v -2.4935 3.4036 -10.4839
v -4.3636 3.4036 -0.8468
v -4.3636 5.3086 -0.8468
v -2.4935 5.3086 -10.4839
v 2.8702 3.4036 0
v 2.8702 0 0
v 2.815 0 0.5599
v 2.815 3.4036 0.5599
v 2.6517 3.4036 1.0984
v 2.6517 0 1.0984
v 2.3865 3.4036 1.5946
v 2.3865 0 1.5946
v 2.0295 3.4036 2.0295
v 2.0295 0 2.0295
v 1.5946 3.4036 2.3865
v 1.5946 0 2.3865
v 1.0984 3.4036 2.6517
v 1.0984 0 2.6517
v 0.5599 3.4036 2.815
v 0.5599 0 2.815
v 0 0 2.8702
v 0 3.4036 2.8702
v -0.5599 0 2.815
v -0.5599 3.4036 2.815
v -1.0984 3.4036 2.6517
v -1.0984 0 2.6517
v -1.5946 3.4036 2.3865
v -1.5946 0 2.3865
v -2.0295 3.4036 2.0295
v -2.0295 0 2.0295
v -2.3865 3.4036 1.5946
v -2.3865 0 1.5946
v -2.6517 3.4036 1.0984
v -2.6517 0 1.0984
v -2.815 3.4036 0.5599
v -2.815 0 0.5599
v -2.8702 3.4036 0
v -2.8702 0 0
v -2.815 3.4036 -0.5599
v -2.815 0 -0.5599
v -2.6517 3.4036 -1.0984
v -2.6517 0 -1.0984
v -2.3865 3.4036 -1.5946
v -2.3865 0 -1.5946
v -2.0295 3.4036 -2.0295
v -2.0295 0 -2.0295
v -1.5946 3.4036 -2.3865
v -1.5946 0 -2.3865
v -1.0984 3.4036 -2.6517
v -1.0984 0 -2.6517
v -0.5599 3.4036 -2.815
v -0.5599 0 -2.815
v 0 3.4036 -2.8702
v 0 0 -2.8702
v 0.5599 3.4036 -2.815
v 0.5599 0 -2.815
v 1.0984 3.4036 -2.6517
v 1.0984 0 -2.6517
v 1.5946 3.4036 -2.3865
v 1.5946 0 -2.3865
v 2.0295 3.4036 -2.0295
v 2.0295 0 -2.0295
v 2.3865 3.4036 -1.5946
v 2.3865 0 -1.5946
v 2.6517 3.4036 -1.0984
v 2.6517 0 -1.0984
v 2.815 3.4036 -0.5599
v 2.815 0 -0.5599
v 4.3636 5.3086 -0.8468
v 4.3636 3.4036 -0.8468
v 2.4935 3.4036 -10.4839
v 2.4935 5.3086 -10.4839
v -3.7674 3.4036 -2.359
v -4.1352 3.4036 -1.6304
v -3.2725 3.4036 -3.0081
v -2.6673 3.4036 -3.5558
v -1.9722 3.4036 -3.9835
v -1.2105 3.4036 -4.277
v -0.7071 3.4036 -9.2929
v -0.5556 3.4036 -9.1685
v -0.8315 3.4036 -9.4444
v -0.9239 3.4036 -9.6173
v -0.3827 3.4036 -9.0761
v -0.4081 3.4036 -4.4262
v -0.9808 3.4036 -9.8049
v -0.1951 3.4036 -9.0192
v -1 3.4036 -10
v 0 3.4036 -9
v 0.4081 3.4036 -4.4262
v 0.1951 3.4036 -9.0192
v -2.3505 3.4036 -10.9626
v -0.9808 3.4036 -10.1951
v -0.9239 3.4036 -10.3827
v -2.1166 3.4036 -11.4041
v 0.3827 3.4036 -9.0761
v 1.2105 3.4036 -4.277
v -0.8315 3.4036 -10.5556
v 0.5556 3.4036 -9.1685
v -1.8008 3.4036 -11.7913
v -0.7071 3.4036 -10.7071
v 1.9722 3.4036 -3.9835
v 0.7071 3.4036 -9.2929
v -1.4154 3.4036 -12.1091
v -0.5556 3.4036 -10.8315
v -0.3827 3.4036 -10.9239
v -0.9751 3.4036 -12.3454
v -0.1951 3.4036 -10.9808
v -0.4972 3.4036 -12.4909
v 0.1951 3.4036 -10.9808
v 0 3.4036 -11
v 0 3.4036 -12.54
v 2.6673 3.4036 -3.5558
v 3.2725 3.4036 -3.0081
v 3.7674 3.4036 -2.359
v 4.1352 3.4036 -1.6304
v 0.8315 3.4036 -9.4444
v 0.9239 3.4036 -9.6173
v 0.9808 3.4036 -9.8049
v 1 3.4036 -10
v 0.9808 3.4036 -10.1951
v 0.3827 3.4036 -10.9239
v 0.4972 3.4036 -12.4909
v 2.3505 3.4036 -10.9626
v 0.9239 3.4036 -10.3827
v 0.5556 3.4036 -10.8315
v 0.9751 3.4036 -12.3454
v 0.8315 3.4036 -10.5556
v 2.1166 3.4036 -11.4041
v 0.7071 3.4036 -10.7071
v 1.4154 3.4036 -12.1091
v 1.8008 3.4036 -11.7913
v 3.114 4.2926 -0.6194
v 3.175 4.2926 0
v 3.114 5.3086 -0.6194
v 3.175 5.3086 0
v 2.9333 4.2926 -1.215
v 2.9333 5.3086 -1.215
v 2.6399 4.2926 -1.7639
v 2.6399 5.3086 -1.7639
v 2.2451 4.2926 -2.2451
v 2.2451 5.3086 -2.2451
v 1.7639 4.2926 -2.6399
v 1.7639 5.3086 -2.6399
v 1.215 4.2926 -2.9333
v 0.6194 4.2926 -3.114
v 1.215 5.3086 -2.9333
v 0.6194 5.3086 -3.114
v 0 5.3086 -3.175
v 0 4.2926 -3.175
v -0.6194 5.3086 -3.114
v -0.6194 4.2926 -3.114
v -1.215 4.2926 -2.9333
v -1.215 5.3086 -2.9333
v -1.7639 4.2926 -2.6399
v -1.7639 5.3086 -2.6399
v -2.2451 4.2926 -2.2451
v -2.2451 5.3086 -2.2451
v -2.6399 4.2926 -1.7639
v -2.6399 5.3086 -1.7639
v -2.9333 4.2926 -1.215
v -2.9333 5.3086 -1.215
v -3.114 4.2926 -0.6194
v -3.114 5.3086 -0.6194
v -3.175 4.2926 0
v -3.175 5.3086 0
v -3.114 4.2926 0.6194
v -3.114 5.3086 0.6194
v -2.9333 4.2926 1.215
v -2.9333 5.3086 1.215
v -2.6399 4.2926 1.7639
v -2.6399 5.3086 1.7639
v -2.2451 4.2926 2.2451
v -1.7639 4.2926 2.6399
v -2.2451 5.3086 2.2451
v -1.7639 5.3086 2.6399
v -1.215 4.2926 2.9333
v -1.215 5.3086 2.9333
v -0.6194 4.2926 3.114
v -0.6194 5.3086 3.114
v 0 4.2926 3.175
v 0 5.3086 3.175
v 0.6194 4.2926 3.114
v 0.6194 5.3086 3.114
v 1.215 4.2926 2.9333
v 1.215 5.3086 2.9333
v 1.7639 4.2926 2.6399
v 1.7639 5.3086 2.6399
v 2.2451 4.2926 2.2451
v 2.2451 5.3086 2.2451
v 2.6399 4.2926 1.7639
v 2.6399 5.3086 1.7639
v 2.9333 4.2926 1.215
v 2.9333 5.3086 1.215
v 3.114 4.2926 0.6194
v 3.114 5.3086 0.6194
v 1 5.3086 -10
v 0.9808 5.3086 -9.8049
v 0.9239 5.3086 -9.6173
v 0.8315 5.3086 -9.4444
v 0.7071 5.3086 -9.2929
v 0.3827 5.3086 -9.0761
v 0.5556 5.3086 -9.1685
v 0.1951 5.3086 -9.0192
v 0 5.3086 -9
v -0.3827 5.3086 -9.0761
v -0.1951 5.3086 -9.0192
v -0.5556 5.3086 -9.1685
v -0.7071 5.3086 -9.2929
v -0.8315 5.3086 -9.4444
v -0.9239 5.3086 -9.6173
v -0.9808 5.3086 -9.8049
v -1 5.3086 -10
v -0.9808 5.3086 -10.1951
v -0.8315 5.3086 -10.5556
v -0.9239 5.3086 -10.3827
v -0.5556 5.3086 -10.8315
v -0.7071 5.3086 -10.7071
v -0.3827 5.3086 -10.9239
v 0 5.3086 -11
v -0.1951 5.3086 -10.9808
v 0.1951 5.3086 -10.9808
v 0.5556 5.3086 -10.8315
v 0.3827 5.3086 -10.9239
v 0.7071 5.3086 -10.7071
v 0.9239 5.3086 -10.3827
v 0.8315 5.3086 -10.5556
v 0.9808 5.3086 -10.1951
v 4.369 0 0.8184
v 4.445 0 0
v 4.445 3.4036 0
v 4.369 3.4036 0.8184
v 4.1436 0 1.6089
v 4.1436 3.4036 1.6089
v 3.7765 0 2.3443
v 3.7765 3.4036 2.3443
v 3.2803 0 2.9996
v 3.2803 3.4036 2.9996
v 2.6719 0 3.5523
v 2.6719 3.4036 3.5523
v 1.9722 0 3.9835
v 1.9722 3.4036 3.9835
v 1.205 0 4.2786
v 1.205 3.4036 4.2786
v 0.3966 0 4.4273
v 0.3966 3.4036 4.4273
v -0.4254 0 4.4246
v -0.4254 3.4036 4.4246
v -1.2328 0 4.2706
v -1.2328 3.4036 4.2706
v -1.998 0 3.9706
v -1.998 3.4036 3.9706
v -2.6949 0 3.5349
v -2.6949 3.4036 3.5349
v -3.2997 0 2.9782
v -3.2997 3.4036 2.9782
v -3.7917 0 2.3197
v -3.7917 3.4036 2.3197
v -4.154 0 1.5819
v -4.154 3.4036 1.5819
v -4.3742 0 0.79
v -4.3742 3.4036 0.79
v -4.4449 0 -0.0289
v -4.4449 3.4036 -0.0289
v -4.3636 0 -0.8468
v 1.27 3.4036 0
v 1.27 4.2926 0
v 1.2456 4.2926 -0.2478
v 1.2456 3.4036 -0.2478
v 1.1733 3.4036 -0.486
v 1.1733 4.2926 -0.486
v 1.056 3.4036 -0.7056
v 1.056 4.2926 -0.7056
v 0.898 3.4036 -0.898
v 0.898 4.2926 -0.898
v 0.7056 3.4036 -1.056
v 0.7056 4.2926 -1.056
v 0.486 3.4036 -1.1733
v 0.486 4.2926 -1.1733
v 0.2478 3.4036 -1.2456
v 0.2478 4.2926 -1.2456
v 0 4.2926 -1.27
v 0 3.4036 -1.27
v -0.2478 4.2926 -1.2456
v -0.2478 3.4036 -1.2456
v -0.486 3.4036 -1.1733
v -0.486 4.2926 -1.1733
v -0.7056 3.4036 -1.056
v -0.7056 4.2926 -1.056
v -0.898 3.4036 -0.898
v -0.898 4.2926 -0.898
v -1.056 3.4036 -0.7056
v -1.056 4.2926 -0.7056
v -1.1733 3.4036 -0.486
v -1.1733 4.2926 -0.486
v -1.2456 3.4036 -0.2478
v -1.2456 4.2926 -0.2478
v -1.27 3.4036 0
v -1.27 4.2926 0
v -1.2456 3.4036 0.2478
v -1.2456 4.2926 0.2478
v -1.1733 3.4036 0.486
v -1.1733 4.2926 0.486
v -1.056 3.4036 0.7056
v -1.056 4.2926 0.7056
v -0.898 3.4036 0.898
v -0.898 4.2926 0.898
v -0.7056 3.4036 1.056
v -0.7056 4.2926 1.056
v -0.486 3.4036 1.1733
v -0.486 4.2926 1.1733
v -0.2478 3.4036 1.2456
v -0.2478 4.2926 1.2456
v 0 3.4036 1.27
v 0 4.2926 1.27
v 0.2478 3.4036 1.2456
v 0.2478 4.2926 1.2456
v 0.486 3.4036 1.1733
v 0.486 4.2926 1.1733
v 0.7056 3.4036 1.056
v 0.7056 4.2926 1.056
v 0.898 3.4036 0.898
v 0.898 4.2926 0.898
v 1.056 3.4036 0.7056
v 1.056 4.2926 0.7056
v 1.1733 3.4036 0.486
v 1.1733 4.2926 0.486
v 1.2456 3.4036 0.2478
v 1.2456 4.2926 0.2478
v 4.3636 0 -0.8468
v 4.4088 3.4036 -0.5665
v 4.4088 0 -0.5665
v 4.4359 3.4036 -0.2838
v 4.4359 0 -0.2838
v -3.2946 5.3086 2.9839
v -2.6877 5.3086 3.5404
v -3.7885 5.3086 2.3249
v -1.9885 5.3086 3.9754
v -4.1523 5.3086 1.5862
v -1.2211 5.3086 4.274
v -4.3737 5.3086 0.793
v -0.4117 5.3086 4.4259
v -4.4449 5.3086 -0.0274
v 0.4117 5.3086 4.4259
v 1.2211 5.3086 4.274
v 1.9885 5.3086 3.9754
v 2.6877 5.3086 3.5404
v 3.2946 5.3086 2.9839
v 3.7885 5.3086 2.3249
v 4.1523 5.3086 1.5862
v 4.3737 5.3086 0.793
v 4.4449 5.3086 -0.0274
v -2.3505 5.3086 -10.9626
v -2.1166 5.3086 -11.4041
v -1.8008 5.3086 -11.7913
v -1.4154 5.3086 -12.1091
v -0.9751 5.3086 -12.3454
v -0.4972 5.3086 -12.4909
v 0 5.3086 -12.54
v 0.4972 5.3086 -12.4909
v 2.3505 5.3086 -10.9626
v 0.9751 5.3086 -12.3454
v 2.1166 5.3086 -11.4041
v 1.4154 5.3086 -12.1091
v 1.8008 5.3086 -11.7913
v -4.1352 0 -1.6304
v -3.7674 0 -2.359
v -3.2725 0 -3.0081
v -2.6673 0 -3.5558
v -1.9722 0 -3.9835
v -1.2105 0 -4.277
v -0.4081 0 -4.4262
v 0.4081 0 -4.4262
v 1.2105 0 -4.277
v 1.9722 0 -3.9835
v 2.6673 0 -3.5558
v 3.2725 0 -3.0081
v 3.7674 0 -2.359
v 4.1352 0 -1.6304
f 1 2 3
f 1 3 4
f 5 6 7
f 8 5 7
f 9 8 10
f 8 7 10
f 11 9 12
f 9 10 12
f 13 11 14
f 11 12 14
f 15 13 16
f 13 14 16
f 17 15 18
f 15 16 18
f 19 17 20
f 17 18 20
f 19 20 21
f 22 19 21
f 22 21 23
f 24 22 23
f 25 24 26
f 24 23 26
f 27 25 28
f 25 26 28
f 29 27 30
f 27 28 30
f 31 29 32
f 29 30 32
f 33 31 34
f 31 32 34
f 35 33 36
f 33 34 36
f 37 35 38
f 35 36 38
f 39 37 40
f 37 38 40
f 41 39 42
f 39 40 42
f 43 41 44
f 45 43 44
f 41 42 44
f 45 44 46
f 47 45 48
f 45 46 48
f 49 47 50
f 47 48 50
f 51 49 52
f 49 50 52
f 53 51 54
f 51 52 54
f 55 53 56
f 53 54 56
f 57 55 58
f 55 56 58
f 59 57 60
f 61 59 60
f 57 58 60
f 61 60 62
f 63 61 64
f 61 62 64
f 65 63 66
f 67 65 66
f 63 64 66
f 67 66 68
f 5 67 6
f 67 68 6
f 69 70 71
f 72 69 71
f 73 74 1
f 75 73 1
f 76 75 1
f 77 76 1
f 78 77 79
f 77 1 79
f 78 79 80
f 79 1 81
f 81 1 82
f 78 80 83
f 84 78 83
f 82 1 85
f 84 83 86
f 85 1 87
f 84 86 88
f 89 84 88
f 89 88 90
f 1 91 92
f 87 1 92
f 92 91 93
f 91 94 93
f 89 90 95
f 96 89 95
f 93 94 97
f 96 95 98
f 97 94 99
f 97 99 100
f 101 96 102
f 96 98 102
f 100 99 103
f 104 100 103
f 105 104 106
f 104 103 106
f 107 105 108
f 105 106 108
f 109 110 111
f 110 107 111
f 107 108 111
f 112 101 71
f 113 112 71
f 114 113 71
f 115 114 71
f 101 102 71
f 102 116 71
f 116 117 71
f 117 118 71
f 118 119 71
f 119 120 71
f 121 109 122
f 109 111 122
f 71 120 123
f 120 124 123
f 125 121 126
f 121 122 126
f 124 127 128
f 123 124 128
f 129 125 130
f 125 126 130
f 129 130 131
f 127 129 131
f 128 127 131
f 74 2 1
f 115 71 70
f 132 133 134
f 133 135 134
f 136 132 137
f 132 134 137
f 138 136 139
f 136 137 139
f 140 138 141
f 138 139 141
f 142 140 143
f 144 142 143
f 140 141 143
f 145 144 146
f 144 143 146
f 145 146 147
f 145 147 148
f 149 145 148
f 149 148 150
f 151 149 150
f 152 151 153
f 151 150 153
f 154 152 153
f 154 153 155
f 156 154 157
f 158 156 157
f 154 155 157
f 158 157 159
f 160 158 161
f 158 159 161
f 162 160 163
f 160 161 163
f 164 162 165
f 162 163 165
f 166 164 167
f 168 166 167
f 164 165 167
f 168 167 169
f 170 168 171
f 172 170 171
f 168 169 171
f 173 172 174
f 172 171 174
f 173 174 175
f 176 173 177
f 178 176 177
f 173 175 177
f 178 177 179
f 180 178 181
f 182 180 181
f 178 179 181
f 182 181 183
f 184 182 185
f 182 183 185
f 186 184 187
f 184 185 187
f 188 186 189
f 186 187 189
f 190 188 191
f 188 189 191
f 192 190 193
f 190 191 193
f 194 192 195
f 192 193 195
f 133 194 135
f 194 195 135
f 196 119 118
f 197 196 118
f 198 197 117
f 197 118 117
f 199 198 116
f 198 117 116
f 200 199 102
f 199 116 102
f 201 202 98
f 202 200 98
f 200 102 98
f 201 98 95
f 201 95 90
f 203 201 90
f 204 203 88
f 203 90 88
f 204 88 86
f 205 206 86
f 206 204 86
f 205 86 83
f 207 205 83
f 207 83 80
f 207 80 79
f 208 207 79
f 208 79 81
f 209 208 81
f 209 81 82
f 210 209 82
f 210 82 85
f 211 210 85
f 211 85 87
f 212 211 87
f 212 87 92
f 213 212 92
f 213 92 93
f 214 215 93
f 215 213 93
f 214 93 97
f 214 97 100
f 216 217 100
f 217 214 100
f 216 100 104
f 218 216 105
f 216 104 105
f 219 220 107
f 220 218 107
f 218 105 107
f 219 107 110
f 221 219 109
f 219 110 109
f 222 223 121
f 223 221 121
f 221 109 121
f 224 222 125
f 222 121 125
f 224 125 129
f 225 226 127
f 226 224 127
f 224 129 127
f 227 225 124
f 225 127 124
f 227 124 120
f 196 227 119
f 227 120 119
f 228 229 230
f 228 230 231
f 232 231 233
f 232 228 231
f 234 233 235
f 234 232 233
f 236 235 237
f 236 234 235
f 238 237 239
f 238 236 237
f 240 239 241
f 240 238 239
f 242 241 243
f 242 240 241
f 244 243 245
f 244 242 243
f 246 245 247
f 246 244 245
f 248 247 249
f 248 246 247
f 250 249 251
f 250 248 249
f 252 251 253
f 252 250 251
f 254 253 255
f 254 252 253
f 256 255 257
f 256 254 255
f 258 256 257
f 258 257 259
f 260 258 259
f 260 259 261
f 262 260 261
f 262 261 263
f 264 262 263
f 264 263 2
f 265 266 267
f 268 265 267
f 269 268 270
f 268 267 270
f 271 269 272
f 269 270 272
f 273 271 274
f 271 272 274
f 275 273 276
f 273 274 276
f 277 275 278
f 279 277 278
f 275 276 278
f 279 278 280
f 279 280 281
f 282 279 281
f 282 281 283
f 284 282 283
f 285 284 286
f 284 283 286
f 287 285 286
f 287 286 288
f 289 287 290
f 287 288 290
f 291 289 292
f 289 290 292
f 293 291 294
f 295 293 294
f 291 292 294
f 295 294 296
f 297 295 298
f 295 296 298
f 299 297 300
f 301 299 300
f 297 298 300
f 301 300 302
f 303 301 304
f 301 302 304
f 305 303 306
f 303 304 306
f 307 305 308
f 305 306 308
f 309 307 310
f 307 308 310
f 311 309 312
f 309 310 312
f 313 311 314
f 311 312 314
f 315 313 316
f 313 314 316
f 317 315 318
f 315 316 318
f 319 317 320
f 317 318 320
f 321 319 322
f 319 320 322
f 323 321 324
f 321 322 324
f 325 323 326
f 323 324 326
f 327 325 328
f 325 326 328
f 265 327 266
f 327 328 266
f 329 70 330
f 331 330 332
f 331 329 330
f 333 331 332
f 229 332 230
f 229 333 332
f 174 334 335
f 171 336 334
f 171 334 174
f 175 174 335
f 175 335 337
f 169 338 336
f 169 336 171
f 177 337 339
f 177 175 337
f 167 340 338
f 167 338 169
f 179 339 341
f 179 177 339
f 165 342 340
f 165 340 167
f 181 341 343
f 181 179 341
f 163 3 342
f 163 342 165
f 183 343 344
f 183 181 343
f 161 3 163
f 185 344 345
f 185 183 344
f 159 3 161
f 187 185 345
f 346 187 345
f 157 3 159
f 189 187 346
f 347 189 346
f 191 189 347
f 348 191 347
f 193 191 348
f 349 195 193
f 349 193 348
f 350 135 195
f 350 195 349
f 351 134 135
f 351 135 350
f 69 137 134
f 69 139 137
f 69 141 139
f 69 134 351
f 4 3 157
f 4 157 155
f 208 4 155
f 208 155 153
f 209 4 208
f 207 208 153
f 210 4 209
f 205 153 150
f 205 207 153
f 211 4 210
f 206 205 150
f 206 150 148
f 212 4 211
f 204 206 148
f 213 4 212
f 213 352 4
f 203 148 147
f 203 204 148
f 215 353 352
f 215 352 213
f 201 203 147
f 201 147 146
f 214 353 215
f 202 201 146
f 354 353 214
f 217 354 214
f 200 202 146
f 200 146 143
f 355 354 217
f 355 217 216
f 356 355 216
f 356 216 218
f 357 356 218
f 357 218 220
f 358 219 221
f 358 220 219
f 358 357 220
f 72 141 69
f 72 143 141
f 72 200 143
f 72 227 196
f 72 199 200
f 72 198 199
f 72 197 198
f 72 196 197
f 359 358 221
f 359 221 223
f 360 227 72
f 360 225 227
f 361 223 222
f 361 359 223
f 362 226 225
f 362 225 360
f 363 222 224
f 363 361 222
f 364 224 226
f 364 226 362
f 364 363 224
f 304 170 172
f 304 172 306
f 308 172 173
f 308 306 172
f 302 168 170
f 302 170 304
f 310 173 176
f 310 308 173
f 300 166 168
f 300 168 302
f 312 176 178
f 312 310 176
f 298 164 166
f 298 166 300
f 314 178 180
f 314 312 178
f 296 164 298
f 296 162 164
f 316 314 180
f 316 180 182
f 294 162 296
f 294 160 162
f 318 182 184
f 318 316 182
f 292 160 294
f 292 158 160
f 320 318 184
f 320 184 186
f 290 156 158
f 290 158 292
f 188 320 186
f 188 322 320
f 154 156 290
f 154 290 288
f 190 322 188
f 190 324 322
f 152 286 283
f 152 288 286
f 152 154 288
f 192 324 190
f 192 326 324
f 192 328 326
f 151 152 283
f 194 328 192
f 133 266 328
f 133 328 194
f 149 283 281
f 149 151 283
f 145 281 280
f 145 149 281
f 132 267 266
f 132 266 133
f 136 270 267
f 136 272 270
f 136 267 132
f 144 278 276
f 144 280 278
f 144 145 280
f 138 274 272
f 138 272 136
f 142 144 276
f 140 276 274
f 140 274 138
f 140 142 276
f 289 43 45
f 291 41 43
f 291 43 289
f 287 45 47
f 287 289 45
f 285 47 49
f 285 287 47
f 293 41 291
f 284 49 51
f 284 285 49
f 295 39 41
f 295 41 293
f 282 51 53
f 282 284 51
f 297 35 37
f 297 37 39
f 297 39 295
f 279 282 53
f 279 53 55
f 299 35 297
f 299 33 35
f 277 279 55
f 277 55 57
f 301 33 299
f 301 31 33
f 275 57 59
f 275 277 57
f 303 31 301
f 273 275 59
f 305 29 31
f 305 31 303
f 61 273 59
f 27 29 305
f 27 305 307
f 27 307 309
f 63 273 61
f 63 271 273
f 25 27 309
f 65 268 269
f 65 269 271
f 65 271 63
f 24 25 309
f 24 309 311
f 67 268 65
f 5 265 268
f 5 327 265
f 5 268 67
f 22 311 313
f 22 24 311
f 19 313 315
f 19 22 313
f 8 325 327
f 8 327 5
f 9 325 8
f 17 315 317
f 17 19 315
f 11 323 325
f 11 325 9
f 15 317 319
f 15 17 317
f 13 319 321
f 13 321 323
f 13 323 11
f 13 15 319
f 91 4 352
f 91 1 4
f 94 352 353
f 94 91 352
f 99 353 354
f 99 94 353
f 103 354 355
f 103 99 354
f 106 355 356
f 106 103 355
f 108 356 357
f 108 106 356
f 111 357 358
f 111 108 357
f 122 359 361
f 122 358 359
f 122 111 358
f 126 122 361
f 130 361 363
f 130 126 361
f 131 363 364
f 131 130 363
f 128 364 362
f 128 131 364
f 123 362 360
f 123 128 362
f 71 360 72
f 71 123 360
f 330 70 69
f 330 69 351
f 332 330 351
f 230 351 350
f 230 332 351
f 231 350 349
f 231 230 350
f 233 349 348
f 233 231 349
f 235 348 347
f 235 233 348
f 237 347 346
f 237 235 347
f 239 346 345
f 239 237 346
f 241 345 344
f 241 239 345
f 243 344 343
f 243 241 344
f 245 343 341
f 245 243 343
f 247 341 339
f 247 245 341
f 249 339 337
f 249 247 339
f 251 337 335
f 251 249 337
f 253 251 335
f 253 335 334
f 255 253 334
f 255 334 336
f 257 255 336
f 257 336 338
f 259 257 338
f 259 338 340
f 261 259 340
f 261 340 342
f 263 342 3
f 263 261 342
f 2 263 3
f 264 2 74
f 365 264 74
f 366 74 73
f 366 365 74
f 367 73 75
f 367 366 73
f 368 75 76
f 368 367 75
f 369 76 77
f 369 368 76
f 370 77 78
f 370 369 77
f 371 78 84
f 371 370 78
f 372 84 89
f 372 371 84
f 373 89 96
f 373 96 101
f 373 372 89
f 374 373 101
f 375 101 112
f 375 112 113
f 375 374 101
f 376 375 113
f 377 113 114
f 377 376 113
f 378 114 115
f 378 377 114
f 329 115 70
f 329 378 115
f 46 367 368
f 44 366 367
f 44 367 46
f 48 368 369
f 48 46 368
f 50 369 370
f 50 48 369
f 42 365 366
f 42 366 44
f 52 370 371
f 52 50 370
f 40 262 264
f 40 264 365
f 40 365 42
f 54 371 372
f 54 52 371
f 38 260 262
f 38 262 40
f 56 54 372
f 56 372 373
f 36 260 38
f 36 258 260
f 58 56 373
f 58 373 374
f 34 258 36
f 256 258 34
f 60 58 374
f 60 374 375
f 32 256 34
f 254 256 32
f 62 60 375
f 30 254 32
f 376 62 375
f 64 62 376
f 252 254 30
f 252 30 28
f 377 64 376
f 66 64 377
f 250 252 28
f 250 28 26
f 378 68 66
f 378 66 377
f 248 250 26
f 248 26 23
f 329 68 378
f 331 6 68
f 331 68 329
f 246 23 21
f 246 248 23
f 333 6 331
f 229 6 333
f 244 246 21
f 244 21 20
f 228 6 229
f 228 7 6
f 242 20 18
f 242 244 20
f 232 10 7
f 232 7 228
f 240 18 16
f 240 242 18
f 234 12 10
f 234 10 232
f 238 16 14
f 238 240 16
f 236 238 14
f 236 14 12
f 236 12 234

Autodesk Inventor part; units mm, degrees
ref_plane "YZ Plane" through (0, 0, 0) normal (1, 0, 0) x (0, 1, 0)
ref_plane "XZ Plane" through (0, 0, 0) normal (0, 1, 0) x (-1, 0, 0)
ref_plane "XY Plane" through (0, 0, 0) normal (0, 0, 1) x (1, 0, 0)
sketch "Sketch1" plane through (0, 0, 0) normal (0, 1, 0) x (-1, 0, 0)
  circle A0 centre (0, 0) radius 2.8702
  dimension "d0" = 5.7404
extrude "Extrusion1" add sketch "Sketch1" along normal blind 3.4036
sketch "Sketch2" plane through (0, 3.4036, 0) normal (0, 1, 0) x (1, 0, 0)
  circle A0 centre (0, 0) radius 4.445
  line L0 (0, 0) -> (0, 10)
  circle A1 centre (0, 10) radius 1
  circle A2 centre (0, 10) radius 2.54
  line L1 (-4.3636, 0.8468) -> (-2.4935, 10.4839)
  line L2 (4.3636, 0.8468) -> (2.4935, 10.4839)
  dimension "d3" = 8.89
  dimension "d4" = 10
  dimension "d5" = 2
  dimension "d6" = 5.08
extrude "Extrusion2" add sketch "Sketch2" along normal blind 1.905
sketch "Sketch3" plane through (0, 5.3086, 0) normal (0, 1, 0) x (1, 0, 0)
  circle A0 centre (0, 0) radius 1.27
  dimension "d9" = 2.54
extrude "Extrusion3" cut sketch "Sketch3" against normal through all
sketch "Sketch4" plane through (0, 5.3086, 0) normal (0, 1, 0) x (1, 0, 0)
  circle A0 centre (0, 0) radius 3.175
  dimension "d12" = 6.35
extrude "Extrusion4" cut sketch "Sketch4" against normal blind 1.016
sketch "Sketch5" plane through (0, 0, 0) normal (0, -1, 0) x (1, 0, 0)
  circle A0 centre (0, 0) radius 4.445
  circle A1 centre (0, 0) radius 2.8702 projected
  arc A2 (4.3636, -0.8468) -> (-4.3636, -0.8468) centre (0, 0) ccw projected
  dimension "d21" = 8.89
extrude "Extrusion6" add sketch "Sketch5" against normal up to surface (3.4036 mm away)
extrude "Extrusion7" cut sketch "Sketch5" against normal blind 3.4036 contours A1
properties part number "ServoHorn10mmPitch" material "ABS Plastic"
